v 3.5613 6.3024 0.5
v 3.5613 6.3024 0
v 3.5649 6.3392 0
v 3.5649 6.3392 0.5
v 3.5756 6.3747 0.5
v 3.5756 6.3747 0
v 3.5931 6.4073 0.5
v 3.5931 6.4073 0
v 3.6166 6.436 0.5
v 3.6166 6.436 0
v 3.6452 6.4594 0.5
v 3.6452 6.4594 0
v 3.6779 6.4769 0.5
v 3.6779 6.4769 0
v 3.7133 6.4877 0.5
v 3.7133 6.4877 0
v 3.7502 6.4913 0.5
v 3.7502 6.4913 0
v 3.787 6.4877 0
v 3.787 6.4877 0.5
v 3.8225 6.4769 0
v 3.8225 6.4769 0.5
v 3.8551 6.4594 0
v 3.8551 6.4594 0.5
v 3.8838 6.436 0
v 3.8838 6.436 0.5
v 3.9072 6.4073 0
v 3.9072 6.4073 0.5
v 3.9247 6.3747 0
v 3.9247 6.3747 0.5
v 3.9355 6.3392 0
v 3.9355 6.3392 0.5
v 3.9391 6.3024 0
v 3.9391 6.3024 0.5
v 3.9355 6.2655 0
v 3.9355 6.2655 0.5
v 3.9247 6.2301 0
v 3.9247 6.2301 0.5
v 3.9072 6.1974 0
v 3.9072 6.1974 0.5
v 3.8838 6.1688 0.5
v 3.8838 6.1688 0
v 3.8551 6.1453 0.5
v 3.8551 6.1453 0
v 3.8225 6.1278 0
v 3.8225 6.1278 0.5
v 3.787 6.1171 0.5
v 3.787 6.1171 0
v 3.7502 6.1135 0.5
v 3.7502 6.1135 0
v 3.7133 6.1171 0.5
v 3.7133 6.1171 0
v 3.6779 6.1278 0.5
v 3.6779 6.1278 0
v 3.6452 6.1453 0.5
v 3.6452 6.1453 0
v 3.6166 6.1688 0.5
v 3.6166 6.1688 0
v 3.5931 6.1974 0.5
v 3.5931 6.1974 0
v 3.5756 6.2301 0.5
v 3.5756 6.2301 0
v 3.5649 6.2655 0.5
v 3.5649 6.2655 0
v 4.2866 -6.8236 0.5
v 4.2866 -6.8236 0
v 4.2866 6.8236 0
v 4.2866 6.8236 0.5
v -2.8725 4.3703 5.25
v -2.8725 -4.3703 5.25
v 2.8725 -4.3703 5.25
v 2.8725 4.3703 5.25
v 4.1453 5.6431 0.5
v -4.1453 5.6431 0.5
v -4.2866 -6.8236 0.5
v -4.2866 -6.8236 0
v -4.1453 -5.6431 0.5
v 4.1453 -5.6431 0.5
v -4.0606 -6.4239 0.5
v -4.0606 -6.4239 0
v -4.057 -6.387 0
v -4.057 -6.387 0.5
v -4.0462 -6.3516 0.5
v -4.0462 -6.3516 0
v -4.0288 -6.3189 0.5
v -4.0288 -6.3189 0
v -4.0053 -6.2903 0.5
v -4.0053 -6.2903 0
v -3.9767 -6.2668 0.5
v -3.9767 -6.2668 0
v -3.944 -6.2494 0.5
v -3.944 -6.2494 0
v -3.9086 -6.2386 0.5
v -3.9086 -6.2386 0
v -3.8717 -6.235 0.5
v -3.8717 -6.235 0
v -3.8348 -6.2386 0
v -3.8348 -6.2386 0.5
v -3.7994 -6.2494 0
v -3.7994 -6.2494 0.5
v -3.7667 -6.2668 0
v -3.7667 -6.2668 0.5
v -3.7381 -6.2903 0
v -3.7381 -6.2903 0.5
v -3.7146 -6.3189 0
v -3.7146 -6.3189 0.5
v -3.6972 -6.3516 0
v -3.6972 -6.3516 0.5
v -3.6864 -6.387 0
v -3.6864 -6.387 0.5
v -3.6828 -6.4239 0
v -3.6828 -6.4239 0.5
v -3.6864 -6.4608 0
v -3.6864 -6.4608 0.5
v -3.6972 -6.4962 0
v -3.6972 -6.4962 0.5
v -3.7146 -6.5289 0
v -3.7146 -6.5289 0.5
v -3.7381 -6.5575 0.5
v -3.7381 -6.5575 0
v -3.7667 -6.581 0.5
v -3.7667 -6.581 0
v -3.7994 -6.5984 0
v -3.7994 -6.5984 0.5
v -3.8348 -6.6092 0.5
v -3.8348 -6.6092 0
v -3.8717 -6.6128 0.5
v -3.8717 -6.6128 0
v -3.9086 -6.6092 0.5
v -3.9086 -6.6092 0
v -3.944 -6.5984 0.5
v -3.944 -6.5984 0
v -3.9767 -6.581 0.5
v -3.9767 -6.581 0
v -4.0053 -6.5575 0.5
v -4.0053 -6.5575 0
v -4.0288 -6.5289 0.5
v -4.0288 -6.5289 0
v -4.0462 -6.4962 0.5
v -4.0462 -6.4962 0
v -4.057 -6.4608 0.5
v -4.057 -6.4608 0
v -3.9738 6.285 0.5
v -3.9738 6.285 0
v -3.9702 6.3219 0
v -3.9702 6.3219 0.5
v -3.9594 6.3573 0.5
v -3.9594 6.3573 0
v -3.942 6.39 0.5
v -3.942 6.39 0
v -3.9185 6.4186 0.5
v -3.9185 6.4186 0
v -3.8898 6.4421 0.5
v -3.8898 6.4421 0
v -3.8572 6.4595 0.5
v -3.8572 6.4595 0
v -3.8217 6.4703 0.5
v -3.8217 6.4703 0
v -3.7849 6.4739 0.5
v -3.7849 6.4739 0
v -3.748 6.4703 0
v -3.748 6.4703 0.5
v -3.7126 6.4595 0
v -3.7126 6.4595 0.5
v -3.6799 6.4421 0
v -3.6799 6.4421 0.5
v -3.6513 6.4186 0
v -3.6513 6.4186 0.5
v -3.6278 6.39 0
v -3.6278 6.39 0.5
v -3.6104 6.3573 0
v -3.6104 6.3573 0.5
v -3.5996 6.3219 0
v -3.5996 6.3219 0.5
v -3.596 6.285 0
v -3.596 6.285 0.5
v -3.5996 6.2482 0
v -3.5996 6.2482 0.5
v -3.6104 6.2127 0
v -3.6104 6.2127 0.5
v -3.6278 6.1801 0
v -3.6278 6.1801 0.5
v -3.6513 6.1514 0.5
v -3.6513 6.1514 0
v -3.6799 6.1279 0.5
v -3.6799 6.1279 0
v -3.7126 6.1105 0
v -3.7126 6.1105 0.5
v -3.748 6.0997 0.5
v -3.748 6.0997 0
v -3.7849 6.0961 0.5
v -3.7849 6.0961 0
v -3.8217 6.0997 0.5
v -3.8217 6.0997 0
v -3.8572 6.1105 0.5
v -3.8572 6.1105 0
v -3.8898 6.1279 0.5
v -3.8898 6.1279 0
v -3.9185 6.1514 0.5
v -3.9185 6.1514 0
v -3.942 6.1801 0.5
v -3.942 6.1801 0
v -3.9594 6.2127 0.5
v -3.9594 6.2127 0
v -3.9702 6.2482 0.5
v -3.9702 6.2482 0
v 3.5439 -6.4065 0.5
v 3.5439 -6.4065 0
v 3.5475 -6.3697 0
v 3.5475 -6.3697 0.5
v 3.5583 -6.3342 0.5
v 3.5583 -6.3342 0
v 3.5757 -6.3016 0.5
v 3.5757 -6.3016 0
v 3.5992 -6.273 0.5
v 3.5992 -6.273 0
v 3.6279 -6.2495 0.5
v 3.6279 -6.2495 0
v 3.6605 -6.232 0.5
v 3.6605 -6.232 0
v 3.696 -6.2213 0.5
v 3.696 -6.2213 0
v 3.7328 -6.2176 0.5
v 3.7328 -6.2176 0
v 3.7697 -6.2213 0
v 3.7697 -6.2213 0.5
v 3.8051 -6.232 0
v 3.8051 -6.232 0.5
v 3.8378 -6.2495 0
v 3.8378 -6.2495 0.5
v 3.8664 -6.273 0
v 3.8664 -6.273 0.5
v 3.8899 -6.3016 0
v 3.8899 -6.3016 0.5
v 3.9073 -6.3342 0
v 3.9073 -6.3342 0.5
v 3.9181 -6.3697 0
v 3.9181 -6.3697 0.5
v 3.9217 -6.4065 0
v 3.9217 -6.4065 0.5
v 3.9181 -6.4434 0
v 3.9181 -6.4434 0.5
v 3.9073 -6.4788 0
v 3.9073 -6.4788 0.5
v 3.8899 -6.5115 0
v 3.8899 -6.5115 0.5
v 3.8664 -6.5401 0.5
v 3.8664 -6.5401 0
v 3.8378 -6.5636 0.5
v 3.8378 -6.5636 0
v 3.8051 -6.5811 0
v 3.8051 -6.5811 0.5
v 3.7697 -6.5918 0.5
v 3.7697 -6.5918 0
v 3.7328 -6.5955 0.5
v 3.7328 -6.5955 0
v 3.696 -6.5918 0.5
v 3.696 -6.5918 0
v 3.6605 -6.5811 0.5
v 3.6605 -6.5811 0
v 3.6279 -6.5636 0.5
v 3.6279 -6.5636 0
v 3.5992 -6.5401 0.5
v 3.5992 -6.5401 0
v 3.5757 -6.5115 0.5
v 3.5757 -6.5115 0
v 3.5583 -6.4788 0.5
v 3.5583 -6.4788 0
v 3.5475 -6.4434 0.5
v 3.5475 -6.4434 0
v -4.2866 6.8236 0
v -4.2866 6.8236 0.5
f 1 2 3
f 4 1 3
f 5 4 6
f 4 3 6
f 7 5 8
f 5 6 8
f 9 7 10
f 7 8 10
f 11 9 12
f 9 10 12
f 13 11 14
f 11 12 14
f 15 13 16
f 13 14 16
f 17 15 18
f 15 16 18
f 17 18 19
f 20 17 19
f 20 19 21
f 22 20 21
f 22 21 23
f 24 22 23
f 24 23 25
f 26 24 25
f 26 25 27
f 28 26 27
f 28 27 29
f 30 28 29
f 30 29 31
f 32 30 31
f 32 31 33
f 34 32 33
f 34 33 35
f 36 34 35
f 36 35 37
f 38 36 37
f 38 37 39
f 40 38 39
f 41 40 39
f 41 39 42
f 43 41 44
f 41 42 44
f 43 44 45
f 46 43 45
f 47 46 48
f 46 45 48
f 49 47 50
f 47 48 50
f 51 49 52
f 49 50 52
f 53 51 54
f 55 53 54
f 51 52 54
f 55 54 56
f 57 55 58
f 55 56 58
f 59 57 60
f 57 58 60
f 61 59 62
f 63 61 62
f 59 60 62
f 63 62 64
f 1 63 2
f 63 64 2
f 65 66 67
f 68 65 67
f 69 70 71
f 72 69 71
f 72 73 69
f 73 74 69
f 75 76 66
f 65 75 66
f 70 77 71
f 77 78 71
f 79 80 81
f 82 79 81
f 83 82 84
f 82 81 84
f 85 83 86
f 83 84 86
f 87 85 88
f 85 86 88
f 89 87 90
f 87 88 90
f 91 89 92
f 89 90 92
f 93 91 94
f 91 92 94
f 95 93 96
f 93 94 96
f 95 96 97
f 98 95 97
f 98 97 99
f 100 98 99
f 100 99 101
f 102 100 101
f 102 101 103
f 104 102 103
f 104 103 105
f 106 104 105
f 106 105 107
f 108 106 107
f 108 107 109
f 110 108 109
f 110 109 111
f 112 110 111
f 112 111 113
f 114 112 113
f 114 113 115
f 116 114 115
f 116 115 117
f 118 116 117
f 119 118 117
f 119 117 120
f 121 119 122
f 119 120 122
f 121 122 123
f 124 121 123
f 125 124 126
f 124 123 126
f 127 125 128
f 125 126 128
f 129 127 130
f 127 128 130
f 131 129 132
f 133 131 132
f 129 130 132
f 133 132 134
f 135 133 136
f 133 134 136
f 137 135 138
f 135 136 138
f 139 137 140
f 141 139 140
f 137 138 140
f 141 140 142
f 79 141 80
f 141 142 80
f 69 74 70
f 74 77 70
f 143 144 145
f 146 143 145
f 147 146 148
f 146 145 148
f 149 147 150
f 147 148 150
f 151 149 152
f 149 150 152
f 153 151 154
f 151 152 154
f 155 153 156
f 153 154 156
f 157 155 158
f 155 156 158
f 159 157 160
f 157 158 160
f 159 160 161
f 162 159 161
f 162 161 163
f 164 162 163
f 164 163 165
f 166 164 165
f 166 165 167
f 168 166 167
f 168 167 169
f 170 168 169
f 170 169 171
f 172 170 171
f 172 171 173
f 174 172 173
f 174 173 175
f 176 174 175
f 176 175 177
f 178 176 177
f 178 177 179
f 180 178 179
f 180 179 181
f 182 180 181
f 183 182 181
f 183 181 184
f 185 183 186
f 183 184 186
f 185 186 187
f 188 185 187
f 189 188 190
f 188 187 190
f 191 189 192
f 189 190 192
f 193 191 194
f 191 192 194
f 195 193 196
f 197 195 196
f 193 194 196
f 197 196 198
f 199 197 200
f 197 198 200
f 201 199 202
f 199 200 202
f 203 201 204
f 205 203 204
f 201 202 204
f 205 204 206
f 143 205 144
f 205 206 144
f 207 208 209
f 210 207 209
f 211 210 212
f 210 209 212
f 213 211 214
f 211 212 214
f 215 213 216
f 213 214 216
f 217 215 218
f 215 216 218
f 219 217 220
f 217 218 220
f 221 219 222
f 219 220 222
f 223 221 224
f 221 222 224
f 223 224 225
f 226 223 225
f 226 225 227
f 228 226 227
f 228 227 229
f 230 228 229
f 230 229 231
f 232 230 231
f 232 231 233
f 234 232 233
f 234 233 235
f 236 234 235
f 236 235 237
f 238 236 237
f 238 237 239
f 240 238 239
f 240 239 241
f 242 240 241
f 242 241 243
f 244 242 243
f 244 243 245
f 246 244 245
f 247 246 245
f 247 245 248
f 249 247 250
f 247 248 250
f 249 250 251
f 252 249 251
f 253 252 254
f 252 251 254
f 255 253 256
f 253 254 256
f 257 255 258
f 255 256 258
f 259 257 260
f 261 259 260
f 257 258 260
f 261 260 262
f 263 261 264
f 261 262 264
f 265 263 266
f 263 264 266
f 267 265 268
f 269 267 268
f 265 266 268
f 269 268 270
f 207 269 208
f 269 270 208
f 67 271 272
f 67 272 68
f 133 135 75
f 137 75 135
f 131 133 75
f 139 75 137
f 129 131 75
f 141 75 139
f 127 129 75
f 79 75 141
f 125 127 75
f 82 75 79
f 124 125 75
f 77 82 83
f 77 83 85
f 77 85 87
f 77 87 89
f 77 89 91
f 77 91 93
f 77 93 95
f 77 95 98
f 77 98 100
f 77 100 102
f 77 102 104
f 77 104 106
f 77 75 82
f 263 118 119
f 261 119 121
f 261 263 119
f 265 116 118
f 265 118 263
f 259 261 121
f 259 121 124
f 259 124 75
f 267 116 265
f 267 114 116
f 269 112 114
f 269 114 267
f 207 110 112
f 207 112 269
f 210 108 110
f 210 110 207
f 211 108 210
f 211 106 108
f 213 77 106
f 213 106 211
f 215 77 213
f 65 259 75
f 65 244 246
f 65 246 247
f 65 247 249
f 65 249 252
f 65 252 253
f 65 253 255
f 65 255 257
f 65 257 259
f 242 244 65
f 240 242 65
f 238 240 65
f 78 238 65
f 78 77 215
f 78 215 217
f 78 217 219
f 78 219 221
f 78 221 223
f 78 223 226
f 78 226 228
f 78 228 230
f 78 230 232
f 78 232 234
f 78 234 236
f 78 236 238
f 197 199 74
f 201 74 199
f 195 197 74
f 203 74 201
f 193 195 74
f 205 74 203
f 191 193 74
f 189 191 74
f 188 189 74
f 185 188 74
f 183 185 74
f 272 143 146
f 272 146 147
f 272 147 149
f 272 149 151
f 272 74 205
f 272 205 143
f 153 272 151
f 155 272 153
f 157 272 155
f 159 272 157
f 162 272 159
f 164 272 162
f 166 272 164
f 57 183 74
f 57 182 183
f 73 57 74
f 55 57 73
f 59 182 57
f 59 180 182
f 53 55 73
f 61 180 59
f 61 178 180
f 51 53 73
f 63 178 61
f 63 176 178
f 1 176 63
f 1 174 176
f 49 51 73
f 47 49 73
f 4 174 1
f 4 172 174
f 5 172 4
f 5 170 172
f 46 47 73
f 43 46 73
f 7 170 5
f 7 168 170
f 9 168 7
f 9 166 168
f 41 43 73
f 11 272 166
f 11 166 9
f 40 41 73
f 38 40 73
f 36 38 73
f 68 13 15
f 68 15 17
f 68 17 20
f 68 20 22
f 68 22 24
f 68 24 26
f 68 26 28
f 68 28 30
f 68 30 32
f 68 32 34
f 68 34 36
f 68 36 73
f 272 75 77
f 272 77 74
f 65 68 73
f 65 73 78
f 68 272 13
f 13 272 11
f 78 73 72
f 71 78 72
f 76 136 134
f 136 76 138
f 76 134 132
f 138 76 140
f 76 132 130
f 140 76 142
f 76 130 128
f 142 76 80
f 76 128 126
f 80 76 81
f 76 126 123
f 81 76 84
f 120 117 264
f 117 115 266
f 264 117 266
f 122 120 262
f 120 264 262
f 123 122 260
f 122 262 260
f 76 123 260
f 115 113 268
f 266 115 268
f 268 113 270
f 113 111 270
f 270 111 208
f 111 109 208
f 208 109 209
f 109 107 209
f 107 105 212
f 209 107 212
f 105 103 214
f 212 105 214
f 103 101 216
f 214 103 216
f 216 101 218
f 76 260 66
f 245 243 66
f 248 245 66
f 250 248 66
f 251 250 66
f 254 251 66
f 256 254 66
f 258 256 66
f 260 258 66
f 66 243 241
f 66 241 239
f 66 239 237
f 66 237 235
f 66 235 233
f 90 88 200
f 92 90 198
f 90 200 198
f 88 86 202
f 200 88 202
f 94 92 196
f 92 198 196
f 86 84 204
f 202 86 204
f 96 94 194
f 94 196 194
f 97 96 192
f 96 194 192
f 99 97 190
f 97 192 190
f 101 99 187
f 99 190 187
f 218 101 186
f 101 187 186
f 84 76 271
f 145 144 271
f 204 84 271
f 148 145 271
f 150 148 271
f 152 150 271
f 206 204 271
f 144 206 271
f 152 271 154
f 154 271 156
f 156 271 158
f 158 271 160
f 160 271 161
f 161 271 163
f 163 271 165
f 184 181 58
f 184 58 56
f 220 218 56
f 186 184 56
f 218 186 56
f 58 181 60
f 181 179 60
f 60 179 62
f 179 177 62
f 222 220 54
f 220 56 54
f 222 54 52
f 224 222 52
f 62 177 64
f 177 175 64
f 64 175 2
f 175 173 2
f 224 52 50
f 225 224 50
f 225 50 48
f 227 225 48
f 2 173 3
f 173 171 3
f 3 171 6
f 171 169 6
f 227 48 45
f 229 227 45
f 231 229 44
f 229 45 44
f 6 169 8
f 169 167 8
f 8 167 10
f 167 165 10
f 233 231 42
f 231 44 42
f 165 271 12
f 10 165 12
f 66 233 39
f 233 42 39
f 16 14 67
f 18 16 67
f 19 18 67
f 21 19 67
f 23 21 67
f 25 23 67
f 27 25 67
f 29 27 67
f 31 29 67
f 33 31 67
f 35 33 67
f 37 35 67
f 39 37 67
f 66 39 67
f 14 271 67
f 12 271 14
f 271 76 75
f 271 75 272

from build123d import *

# Parameters (mm, degrees)
SKETCH1_W                 = 34.29304938
SKETCH1_H                 = 54.588935748
BOSS_EXTRUDE1_DEPTH       = 2
SKETCH3_W                 = 33.162023886
SKETCH3_H                 = 45.144780362
BOSS_EXTRUDE3_DEPTH       = 19
BOSS_EXTRUDE3_TAPER       = 15
F_1_64_TAPPED_HOLE1_D     = 1.5113
F_1_64_TAPPED_HOLE1_DEPTH = 4.89712
F_1_64_TAPPED_HOLE1_TIP   = 0.454040327
SCALE2_SCALE              = 0.5
SCALE5_SCALE              = 0.5


with BuildPart() as part:
    # Sketch1 → Boss-Extrude1 (new body)
    with BuildSketch(Plane.XY):
        Rectangle(SKETCH1_W, SKETCH1_H)
    extrude(amount=BOSS_EXTRUDE1_DEPTH)

    # Sketch3 → Boss-Extrude3 (add)
    with BuildSketch(Plane.XY.offset(2)):
        Rectangle(SKETCH3_W, SKETCH3_H)
    extrude(amount=BOSS_EXTRUDE3_DEPTH, taper=BOSS_EXTRUDE3_TAPER)

    # #1-64 Tapped Hole1
    with Locations(Plane(origin=(15.000680777, 25.209477417, 2), x_dir=(1, 0, 0), z_dir=(0, 0, 1))):
        with Locations((0, 0), (-30.140256747, -0.069447596), (-30.487494728, -50.905088008), (-0.069447596, -50.835640411)):
            Hole(F_1_64_TAPPED_HOLE1_D / 2, depth=F_1_64_TAPPED_HOLE1_DEPTH)
            with Locations((0, 0, -(F_1_64_TAPPED_HOLE1_DEPTH + F_1_64_TAPPED_HOLE1_TIP / 2))):  # 118° drill point
                Cone(0, F_1_64_TAPPED_HOLE1_D / 2, F_1_64_TAPPED_HOLE1_TIP, mode=Mode.SUBTRACT)


with BuildPart() as part_1:
    # Scale2: scaled about (0, 0, 0)
    add(part.part.scale(SCALE2_SCALE))


with BuildPart() as part_2:
    # Scale5: scaled about (0, 0, 0)
    add(part_1.part.scale(SCALE5_SCALE))


solid = part_2.part
